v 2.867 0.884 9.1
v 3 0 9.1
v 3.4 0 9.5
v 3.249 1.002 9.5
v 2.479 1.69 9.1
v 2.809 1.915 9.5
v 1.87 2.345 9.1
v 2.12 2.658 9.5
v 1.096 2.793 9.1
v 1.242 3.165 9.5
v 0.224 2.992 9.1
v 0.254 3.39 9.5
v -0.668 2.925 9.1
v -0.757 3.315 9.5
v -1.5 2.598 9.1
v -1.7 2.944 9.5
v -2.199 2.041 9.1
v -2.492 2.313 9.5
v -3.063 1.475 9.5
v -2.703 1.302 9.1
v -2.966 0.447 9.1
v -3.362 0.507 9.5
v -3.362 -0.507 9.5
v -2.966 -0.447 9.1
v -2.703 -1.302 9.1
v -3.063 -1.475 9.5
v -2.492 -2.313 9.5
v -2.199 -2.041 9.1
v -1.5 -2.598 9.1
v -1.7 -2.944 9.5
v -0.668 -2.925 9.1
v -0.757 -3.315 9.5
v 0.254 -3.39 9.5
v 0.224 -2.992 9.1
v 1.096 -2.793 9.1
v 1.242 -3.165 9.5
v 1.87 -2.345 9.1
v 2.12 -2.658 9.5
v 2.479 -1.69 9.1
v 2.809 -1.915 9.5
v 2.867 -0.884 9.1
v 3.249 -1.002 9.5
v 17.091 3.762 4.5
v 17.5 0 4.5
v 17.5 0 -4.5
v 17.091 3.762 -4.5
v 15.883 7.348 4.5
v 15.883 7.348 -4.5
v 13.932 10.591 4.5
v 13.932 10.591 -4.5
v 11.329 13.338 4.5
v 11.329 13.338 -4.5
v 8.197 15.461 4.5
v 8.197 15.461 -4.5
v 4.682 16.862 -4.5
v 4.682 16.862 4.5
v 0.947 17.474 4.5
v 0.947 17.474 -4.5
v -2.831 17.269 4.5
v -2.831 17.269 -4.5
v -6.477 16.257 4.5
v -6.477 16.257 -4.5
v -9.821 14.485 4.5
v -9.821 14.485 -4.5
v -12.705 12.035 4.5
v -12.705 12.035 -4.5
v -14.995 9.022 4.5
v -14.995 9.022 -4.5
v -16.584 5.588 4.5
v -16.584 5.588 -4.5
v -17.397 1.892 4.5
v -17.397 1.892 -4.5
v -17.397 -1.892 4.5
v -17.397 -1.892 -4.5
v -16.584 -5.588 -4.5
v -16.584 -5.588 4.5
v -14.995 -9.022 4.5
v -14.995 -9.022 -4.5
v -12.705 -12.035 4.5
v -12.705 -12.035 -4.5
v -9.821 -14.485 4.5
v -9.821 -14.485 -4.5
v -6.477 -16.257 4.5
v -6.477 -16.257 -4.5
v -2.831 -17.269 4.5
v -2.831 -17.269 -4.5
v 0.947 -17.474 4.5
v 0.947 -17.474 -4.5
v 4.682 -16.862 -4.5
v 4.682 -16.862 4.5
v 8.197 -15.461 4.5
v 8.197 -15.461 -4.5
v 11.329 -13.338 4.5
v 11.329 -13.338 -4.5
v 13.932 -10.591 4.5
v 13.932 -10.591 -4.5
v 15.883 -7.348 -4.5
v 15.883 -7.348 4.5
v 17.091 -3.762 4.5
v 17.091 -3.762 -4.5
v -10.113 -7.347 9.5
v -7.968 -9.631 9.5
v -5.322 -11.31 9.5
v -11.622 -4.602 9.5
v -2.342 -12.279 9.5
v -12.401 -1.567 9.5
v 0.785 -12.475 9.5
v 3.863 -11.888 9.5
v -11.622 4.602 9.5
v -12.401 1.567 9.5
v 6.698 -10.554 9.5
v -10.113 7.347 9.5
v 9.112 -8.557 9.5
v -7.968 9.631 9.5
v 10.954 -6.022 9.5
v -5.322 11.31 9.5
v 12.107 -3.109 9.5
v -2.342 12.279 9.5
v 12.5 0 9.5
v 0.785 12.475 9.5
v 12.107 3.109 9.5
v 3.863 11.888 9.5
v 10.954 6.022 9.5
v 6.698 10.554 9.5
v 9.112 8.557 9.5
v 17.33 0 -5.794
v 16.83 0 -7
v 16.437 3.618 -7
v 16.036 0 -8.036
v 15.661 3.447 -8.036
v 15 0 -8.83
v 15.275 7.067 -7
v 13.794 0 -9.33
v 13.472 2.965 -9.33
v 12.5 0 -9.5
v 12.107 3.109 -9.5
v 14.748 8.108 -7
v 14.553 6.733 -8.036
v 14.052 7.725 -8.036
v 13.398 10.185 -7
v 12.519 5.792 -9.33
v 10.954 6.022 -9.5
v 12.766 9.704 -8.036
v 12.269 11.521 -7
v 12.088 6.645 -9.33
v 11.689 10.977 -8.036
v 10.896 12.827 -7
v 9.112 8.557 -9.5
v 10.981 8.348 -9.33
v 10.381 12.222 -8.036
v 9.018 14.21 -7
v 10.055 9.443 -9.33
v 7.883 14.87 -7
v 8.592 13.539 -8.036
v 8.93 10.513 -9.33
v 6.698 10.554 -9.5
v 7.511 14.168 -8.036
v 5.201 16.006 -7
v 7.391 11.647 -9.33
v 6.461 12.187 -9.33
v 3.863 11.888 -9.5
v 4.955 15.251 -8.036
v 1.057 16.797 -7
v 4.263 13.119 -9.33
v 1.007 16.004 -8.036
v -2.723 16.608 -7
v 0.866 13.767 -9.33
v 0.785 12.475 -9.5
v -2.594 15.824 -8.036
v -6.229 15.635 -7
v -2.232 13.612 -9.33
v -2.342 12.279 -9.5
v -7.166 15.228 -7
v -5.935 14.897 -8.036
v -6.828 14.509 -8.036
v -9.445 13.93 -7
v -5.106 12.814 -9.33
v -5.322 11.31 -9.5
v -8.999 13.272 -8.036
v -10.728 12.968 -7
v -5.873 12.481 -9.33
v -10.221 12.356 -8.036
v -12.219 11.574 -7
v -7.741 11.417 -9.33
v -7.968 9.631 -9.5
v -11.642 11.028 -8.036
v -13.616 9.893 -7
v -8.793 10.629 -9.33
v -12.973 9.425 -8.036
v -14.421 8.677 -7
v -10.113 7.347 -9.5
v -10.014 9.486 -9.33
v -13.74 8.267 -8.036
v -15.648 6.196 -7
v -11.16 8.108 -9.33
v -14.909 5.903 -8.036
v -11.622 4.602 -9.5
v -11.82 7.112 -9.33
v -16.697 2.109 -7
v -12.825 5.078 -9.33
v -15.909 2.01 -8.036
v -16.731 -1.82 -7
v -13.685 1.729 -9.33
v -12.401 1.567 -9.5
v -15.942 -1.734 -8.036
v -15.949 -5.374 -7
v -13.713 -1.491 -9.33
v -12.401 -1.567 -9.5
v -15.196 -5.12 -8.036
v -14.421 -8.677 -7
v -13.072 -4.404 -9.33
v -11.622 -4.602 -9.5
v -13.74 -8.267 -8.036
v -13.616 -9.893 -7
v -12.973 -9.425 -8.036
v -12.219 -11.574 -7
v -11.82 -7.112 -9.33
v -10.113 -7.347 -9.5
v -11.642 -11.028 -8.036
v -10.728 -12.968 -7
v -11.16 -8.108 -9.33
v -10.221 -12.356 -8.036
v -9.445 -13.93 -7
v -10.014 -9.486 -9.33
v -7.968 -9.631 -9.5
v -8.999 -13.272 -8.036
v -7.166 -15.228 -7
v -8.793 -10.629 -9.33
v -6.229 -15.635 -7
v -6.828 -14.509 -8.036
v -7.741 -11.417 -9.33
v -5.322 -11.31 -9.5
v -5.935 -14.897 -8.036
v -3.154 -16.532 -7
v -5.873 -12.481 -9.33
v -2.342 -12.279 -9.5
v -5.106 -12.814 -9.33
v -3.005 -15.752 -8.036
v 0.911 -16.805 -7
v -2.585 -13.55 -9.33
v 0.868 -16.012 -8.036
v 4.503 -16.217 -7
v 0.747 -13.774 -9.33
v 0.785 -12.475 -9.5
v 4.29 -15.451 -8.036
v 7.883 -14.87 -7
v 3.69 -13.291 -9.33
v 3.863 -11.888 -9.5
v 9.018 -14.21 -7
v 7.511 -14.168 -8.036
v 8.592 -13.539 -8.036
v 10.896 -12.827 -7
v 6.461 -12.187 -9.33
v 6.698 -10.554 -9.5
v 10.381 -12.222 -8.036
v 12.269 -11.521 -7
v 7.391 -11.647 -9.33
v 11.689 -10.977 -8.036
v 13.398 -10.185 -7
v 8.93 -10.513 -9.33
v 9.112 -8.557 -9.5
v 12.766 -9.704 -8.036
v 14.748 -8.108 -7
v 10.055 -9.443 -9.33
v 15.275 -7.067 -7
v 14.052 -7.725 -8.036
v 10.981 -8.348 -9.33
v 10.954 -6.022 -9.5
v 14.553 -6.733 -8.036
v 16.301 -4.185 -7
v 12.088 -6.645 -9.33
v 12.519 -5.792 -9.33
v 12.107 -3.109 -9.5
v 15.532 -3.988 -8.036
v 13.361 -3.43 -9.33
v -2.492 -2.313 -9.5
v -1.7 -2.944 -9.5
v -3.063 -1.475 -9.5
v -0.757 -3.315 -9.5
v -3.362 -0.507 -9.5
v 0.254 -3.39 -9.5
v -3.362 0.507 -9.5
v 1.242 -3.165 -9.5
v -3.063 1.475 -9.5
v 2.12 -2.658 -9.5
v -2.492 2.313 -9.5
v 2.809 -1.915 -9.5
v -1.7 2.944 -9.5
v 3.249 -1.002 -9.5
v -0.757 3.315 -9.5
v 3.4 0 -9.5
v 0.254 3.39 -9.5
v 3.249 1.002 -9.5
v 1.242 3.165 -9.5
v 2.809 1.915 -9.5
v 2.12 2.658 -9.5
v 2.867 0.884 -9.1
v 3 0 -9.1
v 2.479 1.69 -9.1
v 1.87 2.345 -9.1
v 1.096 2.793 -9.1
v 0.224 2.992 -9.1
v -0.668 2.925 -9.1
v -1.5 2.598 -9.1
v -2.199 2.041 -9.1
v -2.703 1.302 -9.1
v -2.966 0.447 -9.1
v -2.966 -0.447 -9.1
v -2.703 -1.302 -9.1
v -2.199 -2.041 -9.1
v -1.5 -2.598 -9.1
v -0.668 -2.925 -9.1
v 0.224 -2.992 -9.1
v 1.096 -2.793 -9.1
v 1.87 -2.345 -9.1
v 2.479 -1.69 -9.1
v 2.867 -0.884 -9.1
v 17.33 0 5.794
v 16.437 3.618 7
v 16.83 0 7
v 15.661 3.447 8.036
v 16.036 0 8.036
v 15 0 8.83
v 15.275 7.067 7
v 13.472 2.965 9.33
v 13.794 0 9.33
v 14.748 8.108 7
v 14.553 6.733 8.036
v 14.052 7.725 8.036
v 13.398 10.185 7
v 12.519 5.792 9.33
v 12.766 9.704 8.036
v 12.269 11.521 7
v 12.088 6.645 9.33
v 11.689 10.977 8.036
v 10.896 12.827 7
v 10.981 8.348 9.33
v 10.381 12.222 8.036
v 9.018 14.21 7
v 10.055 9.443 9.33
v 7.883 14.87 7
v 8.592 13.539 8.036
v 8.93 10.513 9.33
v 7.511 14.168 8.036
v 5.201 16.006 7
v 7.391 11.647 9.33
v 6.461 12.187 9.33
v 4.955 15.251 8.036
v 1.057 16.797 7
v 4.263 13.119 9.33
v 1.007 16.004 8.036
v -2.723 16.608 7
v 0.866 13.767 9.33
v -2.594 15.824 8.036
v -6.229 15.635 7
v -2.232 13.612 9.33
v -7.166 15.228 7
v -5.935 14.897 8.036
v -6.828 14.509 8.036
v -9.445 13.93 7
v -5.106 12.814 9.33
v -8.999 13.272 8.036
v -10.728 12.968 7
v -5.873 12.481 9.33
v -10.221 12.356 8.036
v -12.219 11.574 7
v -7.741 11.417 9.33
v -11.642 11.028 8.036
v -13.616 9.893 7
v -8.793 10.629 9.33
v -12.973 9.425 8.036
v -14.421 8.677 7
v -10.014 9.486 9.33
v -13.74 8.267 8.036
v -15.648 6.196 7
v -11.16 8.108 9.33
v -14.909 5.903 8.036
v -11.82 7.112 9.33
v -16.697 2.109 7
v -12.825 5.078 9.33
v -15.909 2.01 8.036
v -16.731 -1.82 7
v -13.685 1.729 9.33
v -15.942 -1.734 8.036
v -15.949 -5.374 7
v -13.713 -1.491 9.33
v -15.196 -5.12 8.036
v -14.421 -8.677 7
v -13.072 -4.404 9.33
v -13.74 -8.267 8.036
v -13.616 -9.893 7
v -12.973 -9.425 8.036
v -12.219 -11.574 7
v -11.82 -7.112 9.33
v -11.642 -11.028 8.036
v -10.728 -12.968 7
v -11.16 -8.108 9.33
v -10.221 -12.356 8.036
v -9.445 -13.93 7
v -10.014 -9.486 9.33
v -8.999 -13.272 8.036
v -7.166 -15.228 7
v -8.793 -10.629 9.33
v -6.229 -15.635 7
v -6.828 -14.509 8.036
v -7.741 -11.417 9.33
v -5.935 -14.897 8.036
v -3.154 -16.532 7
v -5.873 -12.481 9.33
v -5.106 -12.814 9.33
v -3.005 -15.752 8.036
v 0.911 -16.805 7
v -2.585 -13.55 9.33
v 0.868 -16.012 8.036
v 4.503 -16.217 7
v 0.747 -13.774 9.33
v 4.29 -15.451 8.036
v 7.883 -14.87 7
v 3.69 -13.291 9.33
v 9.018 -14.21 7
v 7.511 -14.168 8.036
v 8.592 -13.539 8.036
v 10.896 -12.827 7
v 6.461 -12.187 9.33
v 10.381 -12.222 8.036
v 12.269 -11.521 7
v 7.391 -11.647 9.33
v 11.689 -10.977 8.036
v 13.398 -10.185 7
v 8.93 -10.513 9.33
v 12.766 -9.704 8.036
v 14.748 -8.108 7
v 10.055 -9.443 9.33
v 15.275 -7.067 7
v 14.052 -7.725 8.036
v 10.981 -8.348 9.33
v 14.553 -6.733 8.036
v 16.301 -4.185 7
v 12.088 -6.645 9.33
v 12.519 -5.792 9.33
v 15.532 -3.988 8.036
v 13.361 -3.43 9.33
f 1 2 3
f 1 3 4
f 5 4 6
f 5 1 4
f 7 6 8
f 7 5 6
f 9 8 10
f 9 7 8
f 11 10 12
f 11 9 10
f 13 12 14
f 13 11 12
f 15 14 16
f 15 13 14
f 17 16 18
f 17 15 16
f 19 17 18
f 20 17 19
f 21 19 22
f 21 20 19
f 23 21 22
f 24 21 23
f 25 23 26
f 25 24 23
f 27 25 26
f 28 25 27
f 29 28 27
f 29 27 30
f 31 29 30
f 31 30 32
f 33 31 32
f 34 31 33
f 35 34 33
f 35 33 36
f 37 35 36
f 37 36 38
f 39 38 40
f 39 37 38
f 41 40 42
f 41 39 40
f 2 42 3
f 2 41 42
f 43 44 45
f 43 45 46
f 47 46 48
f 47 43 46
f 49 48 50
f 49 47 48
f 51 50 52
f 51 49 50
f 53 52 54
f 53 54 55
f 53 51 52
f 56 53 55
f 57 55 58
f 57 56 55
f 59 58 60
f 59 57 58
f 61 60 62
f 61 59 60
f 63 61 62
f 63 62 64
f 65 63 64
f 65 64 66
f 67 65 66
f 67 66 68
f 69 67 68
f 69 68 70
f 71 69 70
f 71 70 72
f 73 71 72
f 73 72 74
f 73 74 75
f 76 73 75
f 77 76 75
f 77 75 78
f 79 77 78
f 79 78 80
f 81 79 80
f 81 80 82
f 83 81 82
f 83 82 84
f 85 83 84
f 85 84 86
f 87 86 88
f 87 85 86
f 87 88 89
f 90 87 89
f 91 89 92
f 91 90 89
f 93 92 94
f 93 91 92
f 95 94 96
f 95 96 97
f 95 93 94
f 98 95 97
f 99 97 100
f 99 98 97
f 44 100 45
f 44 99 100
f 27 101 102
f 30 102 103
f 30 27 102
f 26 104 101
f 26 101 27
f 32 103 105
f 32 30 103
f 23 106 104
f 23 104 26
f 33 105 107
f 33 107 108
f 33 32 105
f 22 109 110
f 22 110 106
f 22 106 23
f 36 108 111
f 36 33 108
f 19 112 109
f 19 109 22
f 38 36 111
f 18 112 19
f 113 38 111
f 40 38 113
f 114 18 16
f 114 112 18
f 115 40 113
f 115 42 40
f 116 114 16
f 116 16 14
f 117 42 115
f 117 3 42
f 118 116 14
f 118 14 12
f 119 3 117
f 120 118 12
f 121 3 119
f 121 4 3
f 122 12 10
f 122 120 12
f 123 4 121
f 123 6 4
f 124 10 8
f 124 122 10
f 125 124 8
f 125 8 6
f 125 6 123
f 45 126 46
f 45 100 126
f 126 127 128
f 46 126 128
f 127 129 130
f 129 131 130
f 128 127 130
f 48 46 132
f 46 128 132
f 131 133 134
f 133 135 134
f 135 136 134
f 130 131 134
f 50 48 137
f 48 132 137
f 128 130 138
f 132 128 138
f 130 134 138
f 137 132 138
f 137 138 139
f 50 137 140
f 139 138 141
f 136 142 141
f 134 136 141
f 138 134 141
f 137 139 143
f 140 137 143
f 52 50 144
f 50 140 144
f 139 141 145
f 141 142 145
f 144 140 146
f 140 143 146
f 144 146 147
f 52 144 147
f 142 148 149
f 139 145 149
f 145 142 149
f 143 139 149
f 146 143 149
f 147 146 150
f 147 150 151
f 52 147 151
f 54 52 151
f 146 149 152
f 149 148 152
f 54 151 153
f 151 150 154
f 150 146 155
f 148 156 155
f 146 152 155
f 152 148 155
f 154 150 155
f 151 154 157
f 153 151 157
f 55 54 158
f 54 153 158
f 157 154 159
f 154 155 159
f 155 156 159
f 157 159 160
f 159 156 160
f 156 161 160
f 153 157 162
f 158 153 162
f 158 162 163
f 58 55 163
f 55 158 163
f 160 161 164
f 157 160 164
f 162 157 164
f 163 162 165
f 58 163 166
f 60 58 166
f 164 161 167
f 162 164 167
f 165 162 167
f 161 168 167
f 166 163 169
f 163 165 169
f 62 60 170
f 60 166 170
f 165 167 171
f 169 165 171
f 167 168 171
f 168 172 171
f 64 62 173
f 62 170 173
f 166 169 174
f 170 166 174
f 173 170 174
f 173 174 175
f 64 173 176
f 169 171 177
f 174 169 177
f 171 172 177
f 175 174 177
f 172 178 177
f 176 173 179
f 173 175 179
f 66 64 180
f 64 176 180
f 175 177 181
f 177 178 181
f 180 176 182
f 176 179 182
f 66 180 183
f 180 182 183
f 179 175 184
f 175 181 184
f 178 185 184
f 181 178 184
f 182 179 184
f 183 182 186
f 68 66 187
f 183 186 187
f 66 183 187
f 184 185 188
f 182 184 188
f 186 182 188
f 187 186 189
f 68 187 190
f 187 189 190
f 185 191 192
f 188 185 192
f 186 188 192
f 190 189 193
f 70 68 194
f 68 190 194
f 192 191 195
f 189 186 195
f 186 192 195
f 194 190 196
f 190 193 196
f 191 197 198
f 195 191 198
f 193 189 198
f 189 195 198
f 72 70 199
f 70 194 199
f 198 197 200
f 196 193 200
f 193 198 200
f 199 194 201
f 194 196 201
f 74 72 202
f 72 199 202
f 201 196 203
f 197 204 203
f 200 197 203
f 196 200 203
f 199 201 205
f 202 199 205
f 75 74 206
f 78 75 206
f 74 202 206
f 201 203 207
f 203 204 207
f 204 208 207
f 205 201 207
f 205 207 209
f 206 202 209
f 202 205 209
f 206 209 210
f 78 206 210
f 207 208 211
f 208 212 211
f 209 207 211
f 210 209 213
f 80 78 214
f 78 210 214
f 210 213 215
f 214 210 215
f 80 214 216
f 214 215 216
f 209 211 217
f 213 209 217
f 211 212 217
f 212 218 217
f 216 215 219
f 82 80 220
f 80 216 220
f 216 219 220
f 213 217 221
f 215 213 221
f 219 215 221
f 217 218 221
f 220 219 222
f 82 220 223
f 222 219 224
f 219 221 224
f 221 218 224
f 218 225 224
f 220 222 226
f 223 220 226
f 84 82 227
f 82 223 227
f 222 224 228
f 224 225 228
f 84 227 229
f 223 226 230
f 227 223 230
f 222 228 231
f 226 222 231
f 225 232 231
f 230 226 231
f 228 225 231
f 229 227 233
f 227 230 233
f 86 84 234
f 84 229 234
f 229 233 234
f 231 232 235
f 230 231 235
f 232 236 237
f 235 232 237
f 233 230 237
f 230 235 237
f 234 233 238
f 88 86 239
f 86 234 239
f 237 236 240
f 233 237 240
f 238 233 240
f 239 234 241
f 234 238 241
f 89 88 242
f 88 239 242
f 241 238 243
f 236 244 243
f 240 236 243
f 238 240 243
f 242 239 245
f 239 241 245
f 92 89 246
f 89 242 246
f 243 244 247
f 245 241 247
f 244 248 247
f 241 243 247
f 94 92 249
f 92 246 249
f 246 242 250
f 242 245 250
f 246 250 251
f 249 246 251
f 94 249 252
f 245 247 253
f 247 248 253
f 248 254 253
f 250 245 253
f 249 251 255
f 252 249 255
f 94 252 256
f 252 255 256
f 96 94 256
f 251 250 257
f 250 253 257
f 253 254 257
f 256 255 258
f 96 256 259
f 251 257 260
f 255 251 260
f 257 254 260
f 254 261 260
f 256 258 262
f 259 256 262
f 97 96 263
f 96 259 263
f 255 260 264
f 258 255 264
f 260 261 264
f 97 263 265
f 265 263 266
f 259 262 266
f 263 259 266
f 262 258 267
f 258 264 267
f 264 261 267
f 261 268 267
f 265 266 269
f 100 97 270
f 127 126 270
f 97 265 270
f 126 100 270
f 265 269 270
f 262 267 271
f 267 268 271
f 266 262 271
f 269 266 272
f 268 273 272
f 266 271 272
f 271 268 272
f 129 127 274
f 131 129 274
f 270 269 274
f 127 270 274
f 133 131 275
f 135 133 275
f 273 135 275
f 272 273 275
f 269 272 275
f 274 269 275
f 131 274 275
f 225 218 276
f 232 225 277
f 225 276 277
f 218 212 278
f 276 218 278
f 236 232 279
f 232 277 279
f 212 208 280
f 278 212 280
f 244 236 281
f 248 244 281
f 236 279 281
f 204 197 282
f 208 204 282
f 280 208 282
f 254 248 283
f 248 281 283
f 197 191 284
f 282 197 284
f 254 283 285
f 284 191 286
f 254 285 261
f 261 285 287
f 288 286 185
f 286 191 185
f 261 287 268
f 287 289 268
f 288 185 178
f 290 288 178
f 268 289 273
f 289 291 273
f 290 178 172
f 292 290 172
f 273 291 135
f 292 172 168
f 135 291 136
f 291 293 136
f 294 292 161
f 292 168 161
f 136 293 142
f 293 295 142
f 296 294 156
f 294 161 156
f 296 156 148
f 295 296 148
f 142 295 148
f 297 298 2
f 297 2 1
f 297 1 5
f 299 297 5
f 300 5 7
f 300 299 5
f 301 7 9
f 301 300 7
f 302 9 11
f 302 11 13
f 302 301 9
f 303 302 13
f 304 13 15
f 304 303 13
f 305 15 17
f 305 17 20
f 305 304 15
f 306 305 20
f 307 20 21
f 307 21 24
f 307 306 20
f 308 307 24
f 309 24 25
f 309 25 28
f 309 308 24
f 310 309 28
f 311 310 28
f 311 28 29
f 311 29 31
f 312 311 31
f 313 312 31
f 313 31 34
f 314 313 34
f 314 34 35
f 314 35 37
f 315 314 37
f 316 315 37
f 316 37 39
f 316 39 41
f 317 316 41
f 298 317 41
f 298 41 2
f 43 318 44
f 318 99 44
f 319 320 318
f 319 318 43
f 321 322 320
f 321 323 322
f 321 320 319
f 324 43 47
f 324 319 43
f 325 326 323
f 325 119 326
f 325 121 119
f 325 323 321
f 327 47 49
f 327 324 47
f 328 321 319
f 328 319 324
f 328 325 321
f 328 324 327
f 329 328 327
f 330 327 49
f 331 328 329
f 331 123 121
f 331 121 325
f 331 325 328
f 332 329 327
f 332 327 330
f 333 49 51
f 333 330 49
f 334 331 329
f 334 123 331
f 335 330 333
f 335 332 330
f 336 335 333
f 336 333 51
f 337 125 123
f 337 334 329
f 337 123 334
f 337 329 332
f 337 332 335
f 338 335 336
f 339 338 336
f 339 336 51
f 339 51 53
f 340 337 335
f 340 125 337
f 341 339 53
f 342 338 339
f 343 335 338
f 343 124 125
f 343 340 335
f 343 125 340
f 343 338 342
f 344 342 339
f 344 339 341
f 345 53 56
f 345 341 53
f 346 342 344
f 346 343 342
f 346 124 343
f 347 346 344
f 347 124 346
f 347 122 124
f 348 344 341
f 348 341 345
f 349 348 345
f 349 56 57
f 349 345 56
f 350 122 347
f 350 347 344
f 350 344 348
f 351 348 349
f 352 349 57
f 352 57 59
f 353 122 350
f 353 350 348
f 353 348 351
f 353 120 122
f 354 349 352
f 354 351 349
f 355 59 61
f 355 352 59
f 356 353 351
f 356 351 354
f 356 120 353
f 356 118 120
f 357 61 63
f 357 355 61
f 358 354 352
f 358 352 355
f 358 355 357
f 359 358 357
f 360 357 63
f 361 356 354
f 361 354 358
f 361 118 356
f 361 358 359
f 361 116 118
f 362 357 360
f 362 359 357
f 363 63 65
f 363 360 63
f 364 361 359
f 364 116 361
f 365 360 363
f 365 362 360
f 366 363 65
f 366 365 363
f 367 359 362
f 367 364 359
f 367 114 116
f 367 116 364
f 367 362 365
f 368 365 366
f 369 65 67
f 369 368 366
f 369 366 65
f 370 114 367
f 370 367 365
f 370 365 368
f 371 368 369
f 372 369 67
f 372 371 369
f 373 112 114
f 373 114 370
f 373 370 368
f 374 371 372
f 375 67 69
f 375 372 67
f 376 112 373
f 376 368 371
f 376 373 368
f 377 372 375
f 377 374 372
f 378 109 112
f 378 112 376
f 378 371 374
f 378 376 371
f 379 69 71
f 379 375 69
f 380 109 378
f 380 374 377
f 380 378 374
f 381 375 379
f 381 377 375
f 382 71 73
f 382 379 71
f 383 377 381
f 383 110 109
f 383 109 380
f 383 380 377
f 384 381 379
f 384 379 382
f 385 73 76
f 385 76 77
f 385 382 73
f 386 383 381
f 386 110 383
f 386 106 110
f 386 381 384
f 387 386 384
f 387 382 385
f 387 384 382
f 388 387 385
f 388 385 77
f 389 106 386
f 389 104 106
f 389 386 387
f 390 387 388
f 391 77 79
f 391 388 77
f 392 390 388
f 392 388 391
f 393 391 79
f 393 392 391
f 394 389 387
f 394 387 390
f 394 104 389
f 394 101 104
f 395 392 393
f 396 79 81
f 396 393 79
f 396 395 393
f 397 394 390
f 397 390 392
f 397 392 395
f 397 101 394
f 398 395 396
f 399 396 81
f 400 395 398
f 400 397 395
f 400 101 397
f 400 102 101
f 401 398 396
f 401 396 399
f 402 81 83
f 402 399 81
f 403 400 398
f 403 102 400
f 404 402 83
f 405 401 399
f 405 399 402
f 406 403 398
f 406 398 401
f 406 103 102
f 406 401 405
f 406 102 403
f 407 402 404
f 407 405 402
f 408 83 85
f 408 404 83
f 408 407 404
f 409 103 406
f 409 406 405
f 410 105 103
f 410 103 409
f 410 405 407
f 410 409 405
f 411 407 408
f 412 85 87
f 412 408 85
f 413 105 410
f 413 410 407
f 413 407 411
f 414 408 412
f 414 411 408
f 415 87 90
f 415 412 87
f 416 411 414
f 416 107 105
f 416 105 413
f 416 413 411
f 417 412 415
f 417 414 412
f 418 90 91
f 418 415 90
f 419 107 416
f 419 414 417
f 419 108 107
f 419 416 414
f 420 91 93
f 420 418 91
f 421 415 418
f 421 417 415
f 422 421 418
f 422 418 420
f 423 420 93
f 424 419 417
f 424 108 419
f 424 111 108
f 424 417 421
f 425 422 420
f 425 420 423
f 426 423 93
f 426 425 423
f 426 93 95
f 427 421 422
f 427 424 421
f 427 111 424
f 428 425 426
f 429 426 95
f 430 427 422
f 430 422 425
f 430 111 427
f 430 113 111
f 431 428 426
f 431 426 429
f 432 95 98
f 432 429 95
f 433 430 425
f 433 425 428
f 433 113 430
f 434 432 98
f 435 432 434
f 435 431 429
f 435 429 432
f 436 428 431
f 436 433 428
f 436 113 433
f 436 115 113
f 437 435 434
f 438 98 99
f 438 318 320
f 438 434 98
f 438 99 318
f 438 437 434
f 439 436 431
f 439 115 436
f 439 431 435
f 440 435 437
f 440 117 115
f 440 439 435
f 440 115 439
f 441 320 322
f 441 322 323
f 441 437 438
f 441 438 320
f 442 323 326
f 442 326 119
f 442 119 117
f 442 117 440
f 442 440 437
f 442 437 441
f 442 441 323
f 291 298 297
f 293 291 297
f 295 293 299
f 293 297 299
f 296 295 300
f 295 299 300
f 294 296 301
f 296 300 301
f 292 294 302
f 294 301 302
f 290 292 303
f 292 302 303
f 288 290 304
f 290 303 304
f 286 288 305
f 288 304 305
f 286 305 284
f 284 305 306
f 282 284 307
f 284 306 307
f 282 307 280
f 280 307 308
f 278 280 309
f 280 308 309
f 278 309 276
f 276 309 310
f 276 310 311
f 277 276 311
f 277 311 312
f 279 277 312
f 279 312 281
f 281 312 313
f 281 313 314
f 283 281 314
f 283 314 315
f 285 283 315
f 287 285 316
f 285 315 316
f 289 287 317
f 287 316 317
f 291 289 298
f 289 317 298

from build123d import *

# Parameters (mm, degrees)
SKETCH_1_R      = 17.5
SKETCH_1_R_2    = 3
EXTRUDE_1_DEPTH = 9.5
FILLET_1_R      = 5
CHAMFER_1_SIZE  = 0.4


with BuildPart() as part:
    # 草图1 → 凸台-拉伸1 (new, symmetric)
    with BuildSketch(Plane.XY):
        Circle(SKETCH_1_R)
        Circle(SKETCH_1_R_2, mode=Mode.SUBTRACT)
    extrude(amount=EXTRUDE_1_DEPTH, both=True)

    # 圆角1
    fillet_1_edges = [part.edges().sort_by_distance(p)[0] for p in [
        (-17.5, 0, -9.5),
        (-17.5, 0, 9.5),
    ]]
    fillet(fillet_1_edges, radius=FILLET_1_R)

    # 倒角1
    chamfer_1_edges = [part.edges().sort_by_distance(p)[0] for p in [
        (-3, 0, -9.5),
        (-3, 0, 9.5),
    ]]
    chamfer(chamfer_1_edges, length=CHAMFER_1_SIZE)


solid = part.part
